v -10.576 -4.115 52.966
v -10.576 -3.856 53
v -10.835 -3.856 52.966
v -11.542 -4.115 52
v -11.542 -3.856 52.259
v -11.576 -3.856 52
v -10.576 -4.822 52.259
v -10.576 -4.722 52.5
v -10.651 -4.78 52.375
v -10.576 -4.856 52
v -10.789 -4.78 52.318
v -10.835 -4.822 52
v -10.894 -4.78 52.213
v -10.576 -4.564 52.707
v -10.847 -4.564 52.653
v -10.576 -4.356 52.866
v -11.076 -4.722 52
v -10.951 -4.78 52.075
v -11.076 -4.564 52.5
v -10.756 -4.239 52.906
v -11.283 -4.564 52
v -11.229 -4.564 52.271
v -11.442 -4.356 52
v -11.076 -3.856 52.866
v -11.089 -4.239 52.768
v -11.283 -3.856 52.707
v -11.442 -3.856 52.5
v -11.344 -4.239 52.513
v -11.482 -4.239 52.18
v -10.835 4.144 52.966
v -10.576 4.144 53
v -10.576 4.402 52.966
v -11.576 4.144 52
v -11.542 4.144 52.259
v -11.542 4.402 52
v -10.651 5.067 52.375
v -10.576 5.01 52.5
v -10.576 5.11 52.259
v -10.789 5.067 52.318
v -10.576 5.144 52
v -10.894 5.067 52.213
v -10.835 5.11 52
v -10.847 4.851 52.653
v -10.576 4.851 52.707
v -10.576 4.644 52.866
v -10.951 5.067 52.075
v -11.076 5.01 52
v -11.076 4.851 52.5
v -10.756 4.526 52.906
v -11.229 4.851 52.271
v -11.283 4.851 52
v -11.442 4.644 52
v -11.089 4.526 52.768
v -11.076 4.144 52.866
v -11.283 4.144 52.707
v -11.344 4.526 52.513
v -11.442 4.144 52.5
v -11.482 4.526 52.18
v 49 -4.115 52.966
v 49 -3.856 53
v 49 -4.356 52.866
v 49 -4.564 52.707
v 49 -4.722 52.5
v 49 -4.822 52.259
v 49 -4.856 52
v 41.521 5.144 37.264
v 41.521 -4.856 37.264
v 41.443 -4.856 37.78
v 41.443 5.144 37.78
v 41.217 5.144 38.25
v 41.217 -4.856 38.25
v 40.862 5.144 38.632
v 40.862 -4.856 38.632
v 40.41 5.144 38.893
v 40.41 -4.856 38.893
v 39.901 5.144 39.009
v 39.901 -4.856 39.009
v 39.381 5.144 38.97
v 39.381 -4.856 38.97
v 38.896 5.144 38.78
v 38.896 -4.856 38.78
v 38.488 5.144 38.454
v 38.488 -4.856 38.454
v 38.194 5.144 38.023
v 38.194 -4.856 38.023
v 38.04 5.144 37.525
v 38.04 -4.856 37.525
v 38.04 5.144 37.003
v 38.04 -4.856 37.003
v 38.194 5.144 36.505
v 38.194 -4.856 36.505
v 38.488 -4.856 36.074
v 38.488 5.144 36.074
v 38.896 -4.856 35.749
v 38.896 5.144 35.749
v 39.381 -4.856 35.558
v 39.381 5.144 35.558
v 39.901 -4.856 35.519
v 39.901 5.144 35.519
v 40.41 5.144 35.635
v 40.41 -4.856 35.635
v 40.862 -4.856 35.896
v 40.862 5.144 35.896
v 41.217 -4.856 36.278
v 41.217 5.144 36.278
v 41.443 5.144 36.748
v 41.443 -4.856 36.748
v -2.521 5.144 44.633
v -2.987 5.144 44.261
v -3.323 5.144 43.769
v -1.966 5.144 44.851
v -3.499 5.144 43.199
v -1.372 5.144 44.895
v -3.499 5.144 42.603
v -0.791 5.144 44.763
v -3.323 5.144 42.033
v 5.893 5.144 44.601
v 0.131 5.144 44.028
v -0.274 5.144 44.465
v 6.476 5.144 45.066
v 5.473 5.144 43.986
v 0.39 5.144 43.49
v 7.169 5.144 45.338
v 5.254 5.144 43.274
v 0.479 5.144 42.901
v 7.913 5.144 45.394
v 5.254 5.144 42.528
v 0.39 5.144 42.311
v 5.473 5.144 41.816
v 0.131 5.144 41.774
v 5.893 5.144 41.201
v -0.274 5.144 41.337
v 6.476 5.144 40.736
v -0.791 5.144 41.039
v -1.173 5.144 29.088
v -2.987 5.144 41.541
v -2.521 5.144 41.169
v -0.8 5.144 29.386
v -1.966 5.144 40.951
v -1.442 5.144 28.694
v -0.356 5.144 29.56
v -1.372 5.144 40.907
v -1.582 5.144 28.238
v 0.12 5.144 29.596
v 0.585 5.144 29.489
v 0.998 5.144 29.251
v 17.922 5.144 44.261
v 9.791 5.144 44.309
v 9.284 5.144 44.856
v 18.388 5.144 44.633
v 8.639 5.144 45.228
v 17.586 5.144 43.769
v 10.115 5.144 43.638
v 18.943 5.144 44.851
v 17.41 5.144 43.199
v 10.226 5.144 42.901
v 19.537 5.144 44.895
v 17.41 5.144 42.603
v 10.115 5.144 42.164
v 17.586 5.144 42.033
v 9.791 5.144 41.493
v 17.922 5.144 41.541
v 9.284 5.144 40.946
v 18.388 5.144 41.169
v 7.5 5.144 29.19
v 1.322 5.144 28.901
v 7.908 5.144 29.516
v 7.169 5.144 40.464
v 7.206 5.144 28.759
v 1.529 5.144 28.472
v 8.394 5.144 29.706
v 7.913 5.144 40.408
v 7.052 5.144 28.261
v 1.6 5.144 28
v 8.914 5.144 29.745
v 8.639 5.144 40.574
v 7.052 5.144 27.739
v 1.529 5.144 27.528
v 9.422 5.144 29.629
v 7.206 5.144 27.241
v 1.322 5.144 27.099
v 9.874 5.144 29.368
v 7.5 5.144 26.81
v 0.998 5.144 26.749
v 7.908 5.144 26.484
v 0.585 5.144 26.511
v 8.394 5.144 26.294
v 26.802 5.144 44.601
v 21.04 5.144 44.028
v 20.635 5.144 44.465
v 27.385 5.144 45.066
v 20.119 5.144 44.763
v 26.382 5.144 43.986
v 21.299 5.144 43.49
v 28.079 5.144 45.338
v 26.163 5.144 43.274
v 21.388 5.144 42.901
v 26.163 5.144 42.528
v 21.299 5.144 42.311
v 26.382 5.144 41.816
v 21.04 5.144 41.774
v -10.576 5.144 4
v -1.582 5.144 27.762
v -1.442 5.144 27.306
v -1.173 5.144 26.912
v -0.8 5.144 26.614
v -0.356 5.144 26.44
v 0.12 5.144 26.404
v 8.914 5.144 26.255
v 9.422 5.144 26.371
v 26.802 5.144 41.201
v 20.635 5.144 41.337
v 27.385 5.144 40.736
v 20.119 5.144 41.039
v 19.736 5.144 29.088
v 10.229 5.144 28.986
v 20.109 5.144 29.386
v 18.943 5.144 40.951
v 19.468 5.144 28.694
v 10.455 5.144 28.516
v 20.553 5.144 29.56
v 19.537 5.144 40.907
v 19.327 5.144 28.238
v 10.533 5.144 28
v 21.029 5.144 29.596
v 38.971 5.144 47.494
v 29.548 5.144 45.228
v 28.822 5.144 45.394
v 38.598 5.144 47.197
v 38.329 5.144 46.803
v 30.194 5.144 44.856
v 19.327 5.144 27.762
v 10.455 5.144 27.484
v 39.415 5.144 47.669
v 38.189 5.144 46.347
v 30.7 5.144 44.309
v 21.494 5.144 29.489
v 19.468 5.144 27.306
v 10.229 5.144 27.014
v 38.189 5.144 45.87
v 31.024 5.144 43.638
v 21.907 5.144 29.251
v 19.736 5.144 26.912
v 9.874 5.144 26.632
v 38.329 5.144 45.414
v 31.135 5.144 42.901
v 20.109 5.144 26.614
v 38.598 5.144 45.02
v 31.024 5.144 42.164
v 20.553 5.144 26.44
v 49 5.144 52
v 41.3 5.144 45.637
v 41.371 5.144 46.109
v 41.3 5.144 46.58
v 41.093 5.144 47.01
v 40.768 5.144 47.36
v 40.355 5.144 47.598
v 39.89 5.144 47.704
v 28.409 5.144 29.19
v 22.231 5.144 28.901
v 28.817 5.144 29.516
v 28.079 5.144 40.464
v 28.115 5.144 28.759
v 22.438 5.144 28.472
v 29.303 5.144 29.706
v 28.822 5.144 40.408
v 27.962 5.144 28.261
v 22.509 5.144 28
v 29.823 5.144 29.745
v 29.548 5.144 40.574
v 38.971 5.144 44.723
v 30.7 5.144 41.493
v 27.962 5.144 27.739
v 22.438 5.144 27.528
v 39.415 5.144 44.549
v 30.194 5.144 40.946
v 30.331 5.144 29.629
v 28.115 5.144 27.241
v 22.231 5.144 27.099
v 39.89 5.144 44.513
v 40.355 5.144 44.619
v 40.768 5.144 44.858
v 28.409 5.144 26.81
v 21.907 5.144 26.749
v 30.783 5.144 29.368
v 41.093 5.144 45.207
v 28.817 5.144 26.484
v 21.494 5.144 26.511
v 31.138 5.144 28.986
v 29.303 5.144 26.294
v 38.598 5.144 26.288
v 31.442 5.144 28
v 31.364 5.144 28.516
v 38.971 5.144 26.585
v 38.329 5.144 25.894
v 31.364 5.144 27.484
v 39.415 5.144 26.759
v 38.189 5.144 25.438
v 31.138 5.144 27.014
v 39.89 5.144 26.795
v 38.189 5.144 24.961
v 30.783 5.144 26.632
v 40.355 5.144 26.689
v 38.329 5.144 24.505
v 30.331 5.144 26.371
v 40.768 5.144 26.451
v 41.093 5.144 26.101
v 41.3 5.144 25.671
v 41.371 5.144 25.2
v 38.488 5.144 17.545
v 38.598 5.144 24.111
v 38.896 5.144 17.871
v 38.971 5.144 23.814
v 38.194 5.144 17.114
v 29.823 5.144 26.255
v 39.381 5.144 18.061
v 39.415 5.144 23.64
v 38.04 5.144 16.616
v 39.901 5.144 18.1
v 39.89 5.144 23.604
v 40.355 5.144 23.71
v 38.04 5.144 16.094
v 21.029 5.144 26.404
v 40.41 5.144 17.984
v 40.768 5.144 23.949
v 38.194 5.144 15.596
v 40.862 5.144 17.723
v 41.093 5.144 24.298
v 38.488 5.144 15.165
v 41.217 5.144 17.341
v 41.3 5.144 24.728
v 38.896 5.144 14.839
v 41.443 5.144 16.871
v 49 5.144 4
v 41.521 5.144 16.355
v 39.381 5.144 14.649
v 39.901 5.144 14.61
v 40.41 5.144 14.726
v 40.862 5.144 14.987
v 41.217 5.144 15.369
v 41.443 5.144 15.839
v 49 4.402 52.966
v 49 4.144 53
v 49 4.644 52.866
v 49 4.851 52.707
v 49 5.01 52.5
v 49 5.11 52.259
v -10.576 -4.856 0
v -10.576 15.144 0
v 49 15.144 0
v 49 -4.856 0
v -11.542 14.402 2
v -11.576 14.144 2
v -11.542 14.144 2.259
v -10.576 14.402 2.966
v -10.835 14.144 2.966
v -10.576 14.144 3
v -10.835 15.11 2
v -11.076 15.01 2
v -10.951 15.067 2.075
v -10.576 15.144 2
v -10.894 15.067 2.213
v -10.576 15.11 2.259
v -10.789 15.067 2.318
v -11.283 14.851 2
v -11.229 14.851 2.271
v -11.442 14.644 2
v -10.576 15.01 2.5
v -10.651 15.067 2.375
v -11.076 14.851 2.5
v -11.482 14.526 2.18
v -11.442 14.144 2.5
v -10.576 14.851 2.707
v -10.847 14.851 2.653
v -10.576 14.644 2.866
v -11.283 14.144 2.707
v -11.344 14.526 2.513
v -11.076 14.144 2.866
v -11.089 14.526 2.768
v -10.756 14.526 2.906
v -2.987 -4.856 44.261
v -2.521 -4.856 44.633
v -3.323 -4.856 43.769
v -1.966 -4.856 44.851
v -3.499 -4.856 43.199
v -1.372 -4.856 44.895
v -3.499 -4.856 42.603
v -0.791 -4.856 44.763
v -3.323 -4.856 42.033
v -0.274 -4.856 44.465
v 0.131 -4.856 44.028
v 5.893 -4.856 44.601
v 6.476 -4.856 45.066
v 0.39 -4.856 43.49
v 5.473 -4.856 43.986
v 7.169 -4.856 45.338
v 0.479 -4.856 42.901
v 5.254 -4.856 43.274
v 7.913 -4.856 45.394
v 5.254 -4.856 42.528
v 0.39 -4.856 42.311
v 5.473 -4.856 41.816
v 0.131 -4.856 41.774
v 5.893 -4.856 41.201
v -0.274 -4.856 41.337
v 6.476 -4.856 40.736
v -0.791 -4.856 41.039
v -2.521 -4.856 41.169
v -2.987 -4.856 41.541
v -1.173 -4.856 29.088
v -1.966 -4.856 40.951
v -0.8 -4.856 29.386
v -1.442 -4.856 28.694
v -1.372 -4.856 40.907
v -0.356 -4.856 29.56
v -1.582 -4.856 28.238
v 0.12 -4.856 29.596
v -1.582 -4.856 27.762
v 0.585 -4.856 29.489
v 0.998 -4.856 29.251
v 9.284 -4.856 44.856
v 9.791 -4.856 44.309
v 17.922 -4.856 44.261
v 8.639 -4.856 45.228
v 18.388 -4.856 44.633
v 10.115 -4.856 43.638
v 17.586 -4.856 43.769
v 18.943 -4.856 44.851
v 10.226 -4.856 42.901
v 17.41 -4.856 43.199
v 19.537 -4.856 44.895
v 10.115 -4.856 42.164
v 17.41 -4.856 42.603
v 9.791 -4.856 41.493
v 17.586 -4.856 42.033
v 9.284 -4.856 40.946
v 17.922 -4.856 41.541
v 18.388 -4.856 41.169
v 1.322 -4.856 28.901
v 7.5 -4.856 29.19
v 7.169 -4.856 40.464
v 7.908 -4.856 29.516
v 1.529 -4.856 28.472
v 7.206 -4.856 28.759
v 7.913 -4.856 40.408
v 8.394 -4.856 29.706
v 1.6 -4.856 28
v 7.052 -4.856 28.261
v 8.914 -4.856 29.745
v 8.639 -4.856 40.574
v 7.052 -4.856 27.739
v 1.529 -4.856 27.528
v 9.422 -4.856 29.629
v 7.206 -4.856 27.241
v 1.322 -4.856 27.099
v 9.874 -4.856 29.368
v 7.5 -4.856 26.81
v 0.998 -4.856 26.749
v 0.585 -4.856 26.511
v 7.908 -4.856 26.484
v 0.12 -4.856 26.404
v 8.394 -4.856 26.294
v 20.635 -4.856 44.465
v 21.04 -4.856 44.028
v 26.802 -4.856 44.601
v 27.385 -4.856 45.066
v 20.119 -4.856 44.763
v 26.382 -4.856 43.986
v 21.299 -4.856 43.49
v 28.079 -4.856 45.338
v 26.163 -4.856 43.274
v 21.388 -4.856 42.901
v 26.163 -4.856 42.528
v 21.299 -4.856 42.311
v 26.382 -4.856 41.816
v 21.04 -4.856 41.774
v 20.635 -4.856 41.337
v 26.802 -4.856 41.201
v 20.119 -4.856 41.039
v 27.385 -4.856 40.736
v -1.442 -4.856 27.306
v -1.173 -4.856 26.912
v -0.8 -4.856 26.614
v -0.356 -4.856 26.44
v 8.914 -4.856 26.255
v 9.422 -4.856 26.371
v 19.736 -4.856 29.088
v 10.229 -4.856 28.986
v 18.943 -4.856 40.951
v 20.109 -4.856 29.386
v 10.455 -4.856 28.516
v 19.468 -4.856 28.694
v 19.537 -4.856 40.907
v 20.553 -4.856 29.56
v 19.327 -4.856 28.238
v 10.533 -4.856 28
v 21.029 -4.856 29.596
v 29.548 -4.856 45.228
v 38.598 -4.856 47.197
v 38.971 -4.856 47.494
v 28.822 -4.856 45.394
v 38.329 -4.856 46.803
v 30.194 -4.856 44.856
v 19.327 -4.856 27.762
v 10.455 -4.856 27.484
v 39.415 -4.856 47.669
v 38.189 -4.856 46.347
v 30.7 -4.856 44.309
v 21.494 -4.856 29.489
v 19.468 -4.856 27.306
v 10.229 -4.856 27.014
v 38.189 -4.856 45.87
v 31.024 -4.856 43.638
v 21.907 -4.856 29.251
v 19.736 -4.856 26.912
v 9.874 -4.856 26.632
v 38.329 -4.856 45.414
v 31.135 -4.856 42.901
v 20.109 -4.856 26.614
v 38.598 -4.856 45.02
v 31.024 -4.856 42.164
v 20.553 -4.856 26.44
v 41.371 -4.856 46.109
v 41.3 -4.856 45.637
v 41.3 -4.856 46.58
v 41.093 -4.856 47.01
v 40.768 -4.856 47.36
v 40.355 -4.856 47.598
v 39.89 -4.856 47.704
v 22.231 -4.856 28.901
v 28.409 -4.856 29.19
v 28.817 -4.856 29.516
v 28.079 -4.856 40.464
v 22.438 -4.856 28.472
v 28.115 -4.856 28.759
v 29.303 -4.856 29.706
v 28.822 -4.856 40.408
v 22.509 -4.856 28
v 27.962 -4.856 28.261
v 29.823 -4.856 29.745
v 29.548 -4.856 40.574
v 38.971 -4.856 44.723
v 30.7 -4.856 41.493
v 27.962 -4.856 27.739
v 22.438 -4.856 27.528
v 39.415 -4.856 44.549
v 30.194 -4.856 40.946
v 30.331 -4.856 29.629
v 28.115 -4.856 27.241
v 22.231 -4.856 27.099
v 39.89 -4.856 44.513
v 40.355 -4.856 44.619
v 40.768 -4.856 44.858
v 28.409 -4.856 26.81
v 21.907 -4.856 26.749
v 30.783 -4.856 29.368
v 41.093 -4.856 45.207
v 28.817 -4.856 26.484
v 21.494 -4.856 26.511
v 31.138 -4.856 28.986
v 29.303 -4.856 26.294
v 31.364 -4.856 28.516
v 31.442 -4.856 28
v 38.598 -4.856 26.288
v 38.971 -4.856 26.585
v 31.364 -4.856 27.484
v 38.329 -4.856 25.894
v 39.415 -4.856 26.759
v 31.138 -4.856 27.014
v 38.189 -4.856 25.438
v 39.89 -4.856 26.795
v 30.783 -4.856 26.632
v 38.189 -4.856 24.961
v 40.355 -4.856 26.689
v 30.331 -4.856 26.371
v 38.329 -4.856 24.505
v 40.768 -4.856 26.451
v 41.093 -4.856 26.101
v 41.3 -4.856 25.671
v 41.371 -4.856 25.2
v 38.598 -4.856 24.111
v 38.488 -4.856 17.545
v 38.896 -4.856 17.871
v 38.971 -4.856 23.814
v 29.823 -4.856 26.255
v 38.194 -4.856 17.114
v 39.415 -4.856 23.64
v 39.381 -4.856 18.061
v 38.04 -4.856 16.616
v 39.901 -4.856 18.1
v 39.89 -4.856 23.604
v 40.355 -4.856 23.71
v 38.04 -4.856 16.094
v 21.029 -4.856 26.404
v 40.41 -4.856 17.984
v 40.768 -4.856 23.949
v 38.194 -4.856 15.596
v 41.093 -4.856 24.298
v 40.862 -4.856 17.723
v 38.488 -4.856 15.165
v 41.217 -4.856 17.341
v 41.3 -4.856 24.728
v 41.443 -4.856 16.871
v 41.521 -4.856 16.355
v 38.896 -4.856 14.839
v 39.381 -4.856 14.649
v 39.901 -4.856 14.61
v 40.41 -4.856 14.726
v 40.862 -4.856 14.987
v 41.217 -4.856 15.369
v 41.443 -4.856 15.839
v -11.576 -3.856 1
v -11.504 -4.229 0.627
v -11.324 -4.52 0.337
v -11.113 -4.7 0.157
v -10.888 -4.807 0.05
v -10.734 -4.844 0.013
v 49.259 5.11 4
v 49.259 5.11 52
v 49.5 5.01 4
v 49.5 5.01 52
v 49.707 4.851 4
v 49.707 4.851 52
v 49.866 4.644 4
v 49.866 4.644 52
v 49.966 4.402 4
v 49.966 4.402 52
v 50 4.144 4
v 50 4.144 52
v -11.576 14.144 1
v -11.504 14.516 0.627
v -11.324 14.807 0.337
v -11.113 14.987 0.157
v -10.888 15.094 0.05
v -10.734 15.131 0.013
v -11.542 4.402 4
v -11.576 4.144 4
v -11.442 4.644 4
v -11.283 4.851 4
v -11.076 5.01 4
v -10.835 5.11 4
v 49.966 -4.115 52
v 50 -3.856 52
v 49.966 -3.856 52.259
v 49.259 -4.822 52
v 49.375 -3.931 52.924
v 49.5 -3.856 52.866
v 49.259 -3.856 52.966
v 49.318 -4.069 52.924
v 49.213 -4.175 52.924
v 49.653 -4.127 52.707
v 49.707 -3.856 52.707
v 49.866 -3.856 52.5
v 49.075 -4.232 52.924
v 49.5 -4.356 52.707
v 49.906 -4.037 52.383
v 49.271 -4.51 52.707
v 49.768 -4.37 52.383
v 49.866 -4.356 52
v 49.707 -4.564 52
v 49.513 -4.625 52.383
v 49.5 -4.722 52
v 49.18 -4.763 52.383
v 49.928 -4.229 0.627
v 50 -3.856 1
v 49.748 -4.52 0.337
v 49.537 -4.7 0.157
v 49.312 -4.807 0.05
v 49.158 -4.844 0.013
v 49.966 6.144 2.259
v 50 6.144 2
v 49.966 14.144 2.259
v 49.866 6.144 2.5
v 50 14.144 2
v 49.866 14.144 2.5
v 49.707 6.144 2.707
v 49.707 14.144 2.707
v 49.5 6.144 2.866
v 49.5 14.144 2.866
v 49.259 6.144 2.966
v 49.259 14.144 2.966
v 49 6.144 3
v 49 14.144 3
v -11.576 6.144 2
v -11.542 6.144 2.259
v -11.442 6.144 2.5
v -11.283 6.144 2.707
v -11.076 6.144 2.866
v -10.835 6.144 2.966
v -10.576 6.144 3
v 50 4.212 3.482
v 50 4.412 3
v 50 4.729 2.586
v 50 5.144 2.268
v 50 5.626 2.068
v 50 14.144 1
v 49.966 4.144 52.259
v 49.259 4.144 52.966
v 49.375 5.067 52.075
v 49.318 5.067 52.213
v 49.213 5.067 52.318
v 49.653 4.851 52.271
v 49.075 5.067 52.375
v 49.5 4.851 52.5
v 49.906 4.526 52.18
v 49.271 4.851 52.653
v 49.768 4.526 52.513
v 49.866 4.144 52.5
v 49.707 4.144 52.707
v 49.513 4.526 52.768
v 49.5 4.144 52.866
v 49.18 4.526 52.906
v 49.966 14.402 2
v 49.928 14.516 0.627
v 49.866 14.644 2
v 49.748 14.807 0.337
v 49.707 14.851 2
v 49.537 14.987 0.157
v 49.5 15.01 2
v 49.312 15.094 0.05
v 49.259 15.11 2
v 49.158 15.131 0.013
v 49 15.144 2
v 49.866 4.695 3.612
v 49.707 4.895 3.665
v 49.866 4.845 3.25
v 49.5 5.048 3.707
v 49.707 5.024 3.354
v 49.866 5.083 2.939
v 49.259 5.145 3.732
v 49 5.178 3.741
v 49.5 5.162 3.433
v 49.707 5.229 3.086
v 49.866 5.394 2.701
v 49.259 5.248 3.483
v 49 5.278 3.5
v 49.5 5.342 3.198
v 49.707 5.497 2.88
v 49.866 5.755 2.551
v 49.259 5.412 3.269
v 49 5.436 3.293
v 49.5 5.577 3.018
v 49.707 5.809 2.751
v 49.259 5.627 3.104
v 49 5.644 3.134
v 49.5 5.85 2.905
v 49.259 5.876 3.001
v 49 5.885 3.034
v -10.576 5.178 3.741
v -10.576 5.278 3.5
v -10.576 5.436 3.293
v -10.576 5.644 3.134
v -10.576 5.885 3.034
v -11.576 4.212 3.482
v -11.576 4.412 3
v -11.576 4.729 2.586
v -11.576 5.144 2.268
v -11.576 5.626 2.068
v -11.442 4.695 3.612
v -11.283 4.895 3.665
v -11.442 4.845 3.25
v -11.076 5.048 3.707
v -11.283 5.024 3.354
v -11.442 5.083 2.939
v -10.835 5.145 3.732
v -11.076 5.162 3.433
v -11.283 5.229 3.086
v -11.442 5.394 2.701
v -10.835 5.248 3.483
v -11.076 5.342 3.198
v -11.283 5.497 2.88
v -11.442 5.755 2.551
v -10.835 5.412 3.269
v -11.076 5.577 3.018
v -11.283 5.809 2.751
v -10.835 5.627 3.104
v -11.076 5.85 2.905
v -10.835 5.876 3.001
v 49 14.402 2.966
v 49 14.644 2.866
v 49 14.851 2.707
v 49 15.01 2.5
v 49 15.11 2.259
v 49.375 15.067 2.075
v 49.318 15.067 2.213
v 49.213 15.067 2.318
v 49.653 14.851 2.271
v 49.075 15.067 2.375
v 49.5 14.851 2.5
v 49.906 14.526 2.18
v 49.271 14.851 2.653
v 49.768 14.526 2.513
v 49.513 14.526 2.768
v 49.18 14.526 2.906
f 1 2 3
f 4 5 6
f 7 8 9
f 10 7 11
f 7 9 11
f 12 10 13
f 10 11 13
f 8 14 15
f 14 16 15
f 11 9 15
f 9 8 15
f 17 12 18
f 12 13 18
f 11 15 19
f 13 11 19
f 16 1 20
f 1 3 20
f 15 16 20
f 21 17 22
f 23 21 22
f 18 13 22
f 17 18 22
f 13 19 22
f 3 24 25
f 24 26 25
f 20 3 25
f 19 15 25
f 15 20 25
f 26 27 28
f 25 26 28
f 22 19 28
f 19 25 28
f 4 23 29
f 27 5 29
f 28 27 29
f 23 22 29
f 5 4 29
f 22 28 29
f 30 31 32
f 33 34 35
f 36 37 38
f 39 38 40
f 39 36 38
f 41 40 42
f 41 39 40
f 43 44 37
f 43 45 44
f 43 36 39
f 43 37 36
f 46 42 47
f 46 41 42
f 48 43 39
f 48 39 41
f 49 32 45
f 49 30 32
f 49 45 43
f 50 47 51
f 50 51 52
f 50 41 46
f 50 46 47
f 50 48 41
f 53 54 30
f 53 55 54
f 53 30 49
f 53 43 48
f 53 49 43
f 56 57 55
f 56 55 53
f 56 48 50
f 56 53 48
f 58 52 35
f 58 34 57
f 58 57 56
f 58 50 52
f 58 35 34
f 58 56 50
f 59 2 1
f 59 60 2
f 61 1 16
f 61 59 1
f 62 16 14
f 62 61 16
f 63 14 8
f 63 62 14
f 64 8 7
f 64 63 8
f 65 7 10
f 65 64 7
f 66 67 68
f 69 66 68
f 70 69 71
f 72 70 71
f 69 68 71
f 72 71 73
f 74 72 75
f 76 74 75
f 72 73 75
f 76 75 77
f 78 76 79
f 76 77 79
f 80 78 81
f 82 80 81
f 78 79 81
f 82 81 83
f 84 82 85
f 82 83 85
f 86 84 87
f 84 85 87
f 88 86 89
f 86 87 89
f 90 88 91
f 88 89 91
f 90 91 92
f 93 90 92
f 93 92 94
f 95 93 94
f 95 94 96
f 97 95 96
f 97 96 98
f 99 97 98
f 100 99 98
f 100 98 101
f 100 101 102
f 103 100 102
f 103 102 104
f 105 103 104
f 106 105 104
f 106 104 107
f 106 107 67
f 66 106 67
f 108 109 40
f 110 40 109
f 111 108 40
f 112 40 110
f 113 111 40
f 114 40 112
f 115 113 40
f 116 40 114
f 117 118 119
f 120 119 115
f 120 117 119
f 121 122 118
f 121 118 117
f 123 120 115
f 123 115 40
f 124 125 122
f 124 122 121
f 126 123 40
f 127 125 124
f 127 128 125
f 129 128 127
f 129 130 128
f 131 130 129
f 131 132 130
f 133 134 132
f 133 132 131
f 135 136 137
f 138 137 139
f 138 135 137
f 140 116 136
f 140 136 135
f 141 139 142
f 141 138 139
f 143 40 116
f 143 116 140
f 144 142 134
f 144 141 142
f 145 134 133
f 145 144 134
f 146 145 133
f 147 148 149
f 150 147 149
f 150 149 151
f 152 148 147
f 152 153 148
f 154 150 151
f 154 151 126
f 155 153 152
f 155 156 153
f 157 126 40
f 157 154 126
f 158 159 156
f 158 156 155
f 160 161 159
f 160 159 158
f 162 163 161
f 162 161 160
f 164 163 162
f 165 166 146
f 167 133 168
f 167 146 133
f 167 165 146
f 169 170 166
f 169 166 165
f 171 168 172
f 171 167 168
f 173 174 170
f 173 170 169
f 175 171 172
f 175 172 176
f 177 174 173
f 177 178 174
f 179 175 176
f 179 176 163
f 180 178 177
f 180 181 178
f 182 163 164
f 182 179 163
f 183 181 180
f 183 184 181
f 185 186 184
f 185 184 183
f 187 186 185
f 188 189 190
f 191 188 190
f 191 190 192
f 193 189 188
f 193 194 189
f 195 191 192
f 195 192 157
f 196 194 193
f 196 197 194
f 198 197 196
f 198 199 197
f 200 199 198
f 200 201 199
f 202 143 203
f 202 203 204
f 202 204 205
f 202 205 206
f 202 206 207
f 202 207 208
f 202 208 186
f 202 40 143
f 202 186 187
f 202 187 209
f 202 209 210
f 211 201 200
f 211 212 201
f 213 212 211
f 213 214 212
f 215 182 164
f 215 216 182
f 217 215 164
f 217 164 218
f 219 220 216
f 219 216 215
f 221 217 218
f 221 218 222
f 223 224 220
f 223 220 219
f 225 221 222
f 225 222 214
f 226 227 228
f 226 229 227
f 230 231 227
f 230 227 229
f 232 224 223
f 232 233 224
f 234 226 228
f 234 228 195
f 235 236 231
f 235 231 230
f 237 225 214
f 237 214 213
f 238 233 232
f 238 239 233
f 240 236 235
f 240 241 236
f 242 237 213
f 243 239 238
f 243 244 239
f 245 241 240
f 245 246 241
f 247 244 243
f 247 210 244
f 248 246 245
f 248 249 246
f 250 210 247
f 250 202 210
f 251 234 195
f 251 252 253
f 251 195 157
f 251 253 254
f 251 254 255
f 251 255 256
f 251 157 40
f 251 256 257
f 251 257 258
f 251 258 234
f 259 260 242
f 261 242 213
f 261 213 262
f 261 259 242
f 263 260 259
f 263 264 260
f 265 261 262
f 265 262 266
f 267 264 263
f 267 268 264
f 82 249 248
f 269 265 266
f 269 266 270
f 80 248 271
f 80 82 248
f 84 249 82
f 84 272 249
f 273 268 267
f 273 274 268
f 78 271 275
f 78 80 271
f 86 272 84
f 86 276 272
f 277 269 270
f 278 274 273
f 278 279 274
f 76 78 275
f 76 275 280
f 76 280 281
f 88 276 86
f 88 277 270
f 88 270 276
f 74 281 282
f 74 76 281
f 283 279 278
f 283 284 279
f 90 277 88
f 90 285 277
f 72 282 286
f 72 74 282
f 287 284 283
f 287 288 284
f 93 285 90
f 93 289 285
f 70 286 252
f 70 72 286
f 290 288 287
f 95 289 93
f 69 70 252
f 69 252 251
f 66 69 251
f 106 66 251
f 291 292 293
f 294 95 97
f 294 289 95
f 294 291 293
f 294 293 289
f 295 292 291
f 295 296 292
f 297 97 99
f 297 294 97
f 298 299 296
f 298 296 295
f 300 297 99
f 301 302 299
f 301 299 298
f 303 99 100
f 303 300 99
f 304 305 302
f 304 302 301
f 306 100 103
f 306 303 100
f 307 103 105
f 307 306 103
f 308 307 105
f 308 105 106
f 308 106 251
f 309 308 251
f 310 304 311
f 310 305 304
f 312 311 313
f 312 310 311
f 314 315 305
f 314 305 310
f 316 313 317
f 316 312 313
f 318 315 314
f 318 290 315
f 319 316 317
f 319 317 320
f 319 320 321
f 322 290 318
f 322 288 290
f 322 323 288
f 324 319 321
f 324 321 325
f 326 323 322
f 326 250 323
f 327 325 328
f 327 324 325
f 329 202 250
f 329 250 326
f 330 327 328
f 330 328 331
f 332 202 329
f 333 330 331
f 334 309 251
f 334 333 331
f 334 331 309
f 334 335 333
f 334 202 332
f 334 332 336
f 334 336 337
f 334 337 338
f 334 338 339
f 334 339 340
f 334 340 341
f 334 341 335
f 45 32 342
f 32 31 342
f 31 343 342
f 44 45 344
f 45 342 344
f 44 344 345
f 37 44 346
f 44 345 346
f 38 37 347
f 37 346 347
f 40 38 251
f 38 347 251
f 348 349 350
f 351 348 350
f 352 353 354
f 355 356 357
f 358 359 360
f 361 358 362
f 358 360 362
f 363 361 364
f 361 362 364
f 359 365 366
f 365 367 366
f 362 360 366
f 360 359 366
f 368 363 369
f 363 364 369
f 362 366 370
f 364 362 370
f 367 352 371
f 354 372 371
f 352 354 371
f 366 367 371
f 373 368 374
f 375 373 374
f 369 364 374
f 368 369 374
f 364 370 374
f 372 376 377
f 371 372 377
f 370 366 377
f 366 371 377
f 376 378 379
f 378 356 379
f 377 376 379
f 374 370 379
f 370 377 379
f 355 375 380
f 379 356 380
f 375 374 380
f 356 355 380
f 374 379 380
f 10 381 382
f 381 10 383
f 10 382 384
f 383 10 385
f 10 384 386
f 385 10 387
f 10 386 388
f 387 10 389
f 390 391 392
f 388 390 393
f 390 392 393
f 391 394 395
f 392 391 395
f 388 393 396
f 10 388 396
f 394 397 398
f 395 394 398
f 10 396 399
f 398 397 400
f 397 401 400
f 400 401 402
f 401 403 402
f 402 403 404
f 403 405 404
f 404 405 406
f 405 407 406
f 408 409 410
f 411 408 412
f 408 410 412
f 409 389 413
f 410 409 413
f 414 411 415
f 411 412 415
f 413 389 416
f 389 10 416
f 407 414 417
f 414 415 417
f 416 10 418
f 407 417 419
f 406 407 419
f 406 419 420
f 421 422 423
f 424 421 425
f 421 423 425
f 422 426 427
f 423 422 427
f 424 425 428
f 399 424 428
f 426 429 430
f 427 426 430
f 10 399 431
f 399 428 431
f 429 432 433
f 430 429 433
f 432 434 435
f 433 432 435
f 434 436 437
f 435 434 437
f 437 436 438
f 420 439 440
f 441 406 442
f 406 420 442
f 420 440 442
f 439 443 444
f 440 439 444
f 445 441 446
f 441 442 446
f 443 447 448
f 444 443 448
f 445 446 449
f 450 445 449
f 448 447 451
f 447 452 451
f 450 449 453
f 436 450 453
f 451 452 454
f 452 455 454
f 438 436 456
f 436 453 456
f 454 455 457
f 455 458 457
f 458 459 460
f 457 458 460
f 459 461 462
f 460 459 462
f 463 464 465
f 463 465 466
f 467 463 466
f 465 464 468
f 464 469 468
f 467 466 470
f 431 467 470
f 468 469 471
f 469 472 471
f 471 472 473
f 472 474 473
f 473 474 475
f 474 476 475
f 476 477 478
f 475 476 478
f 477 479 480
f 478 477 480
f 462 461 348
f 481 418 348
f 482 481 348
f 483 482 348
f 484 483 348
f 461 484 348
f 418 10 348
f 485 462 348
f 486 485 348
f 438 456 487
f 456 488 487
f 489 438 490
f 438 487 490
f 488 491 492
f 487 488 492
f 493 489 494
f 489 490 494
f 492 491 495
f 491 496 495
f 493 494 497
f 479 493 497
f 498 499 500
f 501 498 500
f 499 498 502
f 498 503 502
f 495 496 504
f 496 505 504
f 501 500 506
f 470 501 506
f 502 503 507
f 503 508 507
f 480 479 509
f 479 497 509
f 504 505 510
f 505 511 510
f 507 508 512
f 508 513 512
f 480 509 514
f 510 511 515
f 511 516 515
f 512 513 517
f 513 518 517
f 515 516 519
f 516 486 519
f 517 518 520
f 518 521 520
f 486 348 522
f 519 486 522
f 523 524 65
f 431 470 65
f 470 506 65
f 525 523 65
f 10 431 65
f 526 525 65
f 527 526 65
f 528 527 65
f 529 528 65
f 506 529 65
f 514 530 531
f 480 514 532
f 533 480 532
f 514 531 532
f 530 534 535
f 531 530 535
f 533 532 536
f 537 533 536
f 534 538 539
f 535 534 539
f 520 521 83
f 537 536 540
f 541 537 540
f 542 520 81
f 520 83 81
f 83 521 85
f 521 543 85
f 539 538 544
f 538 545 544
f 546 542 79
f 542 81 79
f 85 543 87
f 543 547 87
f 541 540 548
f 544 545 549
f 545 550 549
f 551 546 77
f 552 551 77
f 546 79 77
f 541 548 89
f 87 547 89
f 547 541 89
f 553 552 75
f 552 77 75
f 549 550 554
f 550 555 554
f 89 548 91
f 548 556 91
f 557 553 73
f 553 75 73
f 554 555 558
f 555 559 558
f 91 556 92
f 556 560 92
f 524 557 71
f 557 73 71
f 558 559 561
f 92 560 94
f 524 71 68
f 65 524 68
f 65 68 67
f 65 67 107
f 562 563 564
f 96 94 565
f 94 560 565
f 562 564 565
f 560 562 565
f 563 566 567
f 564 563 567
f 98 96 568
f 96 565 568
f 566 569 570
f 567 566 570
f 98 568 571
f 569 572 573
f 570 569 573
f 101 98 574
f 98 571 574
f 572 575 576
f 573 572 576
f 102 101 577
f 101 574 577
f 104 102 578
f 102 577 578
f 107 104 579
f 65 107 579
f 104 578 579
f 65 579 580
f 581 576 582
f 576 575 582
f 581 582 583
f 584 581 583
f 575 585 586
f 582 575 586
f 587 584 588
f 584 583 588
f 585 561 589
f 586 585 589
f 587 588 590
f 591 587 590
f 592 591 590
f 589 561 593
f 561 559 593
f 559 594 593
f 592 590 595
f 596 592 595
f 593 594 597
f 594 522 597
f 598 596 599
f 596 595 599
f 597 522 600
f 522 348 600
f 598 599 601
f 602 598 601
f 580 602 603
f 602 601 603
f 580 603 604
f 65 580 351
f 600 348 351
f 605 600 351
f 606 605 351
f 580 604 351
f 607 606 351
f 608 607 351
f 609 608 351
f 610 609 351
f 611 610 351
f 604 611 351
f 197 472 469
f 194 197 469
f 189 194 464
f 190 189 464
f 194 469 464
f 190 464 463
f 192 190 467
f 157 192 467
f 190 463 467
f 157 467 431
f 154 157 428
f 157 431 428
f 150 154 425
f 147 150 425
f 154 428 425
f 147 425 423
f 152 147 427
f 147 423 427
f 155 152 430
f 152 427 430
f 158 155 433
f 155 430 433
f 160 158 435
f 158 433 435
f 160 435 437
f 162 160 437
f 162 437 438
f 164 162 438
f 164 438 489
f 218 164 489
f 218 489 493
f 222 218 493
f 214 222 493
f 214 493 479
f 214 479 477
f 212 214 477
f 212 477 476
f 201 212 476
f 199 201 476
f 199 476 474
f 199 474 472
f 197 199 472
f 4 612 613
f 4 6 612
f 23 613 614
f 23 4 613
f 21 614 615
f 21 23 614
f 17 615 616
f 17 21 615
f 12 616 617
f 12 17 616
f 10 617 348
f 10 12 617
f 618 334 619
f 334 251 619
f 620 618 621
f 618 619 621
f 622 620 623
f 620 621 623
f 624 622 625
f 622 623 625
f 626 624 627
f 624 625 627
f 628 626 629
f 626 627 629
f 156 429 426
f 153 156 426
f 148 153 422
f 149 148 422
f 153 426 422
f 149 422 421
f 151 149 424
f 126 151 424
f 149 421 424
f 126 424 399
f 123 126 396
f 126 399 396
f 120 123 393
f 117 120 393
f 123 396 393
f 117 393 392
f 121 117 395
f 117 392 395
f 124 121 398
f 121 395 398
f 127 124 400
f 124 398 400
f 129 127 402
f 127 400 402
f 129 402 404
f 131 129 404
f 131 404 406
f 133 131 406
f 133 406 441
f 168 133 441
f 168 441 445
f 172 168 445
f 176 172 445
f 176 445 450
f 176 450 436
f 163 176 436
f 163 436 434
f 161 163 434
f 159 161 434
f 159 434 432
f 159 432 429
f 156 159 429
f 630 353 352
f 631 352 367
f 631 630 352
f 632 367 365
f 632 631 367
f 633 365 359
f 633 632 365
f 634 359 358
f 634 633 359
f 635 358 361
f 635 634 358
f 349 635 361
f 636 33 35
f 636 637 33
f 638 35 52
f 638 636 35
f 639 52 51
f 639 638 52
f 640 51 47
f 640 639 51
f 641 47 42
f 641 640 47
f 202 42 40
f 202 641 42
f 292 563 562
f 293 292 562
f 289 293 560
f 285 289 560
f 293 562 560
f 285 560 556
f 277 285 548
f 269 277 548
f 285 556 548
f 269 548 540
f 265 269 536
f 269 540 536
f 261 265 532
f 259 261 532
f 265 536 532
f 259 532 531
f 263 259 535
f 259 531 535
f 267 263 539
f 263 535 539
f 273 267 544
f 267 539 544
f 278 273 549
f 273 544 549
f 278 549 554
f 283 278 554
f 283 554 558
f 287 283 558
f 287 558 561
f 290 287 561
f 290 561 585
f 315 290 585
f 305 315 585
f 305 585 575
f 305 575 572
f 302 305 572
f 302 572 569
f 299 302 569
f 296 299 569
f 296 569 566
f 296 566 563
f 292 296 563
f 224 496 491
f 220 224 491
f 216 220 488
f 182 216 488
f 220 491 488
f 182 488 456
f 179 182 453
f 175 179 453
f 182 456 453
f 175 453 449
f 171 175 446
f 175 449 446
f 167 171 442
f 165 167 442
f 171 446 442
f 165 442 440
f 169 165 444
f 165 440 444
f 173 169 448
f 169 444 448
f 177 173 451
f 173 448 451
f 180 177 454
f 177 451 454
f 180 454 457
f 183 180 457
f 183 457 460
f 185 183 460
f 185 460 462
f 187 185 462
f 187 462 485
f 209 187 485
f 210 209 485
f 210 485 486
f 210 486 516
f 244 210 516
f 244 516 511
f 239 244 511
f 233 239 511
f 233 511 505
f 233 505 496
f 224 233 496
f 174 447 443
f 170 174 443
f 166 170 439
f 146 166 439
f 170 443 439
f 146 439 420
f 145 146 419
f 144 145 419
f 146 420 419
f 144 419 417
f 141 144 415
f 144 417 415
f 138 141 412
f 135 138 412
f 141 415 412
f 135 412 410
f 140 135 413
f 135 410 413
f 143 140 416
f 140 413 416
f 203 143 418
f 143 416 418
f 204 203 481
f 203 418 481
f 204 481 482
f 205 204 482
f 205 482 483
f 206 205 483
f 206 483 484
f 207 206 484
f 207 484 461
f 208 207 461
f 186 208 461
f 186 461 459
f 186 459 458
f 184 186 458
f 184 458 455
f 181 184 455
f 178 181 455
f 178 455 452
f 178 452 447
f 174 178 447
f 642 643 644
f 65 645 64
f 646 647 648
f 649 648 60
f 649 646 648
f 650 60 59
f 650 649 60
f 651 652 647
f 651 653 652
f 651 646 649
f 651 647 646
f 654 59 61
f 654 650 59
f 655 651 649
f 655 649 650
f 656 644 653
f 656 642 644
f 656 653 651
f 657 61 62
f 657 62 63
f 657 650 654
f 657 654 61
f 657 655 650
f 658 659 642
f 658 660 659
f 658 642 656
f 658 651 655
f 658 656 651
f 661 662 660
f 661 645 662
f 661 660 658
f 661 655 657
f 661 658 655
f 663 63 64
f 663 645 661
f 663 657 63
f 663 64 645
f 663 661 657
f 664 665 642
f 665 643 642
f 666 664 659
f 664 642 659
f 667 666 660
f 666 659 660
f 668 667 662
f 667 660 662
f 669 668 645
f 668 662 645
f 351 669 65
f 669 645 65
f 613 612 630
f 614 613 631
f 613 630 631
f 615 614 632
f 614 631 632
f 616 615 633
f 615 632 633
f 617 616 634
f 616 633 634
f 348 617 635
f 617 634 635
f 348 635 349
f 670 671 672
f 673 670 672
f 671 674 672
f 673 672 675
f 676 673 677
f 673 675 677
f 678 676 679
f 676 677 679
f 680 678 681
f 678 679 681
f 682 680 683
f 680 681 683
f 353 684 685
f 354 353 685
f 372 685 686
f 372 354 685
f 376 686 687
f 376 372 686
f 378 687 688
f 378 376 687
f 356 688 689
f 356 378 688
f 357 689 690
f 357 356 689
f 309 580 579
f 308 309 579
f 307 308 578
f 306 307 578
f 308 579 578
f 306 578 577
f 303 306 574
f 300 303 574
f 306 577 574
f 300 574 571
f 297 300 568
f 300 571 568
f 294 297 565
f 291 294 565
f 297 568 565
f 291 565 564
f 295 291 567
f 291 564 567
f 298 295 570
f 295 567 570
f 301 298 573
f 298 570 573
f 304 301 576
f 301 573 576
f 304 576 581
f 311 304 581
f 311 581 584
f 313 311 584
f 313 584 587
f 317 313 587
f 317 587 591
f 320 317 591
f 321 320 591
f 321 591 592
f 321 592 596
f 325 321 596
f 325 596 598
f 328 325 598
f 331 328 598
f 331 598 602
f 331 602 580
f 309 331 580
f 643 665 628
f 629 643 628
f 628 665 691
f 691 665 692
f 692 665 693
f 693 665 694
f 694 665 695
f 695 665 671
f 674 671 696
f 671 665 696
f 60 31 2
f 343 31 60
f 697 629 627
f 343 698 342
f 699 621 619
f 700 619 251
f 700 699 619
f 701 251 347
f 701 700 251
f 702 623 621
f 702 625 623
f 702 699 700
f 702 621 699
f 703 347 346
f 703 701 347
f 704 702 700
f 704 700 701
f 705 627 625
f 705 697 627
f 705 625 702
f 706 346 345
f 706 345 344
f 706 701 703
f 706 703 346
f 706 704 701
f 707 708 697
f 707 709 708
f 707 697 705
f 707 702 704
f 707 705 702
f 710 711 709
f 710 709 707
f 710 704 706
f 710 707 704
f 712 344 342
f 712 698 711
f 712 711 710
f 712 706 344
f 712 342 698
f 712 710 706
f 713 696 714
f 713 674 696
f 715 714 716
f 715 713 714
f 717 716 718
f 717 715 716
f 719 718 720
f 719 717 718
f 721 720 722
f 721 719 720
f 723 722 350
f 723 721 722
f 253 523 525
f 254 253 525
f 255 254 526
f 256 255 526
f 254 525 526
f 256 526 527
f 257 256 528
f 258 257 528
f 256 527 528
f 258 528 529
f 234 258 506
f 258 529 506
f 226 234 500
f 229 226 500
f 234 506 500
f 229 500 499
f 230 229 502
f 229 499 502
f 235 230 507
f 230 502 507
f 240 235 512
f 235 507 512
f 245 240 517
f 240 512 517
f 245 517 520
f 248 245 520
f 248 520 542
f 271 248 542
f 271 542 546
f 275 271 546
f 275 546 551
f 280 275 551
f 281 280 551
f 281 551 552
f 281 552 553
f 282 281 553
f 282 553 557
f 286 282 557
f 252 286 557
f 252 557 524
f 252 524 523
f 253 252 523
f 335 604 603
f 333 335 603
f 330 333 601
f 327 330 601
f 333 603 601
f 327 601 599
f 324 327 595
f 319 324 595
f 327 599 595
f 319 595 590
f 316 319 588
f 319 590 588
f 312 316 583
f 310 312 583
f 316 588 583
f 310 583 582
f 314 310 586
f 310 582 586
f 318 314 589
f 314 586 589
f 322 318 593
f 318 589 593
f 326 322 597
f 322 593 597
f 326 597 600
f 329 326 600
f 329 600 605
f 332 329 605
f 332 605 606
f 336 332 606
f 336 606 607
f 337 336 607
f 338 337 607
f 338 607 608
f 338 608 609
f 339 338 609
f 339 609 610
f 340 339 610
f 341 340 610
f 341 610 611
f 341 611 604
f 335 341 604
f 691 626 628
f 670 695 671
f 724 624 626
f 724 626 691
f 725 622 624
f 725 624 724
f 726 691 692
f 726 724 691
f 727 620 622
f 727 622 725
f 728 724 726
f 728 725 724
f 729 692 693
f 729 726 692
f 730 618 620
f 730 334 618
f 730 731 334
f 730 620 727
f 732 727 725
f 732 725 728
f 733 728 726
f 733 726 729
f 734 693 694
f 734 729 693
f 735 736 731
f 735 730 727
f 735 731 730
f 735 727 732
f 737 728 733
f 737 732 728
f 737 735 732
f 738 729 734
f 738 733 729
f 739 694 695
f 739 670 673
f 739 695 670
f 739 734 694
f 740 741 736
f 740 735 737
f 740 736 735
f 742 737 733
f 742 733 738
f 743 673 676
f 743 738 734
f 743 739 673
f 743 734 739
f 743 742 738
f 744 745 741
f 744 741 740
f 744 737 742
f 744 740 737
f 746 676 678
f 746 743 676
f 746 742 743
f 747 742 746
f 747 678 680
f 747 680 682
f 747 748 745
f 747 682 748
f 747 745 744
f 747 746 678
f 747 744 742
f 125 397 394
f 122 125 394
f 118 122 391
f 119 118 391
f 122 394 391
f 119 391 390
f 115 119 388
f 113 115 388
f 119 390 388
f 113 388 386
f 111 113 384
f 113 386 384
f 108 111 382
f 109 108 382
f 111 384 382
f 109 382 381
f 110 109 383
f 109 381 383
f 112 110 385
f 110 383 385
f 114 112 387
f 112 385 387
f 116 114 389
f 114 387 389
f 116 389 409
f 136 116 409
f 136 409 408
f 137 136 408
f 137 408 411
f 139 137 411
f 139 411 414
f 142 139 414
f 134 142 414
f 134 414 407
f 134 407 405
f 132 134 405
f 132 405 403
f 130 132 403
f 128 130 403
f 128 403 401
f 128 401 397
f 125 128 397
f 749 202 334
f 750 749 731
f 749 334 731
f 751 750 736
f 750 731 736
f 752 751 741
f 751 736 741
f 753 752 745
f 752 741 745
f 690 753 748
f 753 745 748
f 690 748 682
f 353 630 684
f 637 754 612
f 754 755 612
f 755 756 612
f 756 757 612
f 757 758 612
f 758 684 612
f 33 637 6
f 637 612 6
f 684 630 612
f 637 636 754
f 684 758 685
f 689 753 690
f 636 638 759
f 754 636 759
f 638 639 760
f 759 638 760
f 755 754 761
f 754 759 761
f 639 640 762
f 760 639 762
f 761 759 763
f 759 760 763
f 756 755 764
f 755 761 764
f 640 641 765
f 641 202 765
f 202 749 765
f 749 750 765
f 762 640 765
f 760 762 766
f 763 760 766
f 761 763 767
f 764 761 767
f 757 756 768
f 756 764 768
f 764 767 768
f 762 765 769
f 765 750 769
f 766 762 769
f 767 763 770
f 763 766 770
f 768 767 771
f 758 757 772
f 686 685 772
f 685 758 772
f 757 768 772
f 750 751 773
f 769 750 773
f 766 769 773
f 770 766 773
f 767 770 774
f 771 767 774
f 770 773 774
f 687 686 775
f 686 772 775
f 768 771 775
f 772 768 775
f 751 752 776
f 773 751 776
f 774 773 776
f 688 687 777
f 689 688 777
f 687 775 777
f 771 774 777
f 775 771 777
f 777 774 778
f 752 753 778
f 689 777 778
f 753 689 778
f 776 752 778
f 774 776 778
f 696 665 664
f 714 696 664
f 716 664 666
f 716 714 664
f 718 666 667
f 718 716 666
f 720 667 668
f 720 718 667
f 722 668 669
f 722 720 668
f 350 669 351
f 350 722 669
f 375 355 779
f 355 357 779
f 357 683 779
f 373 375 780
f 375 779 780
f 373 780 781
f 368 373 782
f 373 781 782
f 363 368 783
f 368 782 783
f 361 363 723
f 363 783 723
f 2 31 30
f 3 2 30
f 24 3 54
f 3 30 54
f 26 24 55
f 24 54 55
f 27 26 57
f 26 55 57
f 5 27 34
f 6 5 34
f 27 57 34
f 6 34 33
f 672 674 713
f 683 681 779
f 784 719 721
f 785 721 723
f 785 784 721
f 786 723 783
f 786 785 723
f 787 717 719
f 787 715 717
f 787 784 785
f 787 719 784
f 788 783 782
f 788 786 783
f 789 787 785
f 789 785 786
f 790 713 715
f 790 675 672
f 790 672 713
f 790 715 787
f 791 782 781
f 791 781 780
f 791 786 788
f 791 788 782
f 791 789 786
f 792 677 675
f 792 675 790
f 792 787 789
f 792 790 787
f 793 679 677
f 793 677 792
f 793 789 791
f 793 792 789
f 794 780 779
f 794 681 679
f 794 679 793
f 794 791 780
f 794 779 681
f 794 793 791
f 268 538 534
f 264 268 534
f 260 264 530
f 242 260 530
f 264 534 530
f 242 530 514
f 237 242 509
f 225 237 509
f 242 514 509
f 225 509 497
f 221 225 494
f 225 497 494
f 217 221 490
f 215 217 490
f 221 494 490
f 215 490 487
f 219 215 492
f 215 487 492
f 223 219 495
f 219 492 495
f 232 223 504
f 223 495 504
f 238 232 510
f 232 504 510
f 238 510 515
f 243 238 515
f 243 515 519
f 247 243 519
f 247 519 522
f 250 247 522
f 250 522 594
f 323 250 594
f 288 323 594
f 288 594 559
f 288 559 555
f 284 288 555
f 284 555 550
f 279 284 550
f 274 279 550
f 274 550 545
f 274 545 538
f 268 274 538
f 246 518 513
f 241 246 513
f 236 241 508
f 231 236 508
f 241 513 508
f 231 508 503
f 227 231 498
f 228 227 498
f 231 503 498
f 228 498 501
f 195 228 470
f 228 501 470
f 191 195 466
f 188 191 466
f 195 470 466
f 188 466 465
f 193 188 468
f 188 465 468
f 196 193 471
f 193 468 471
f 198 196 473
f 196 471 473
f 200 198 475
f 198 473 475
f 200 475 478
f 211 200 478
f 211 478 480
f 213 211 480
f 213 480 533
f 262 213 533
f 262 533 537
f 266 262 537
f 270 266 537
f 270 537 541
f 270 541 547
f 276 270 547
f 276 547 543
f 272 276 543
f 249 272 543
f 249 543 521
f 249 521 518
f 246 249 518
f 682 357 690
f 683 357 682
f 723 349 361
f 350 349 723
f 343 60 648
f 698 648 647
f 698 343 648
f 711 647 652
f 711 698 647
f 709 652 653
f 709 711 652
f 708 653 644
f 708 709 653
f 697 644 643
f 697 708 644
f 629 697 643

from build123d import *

# Parameters (mm, degrees)
F0_W          = 100
F0_H          = 5
F1_DEPTH      = 3
F2_W          = 100
F2_H          = 10
F3_DEPTH      = 50
F4_R          = 1.6
F4_R_2        = 1.75
F4_R_3        = 2.5
F4_R_4        = 2
F5_DEPTH      = 50
F7_DEPTH      = 50
F7_DEPTH_BACK = 25
F8_R          = 1


with BuildPart() as f1:
    # F0 (on Top) → F1 (new body)
    with BuildSketch(Plane.XY):
        with Locations((0, 12.6435890049)):
            Rectangle(F0_W, F0_H)
        with Locations((0, 7.6435890049)):
            Rectangle(F0_W, F0_H)
        with Locations((0, 2.6435890049)):
            Rectangle(F0_W, F0_H)
        with Locations((0, -2.3564109951)):
            Rectangle(F0_W, F0_H)
    extrude(amount=F1_DEPTH)

    # F2 (on face) → F3 (join)
    with BuildSketch(Plane.XY.offset(3)):
        with Locations((0, 0.1435890049)):
            Rectangle(F2_W, F2_H)
    extrude(amount=F3_DEPTH)

    # F4 (on face) → F5 (cut)
    with BuildSketch(Plane.XZ.offset(4.8564109951)):
        with Locations((0, 28)):
            Circle(F4_R)
        with Locations((39.7706801567, 25.1996132218)):
            Circle(F4_R)
        with Locations((8.7829349406, 28)):
            Circle(F4_R_2)
        with Locations((39.7706801567, 37.2641024557)):
            Circle(F4_R_2)
        with Locations((20.9091, 28)):
            Circle(F4_R)
        with Locations((29.6920349406, 28)):
            Circle(F4_R_2)
        with Locations((39.7706801567, 46.1087132218)):
            Circle(F4_R)
        with Locations((39.7706801567, 16.3550024557)):
            Circle(F4_R_2)
        with Locations((7.7257619488, 42.9009612363)):
            Circle(F4_R_3)
        with Locations((28.6348619488, 42.9009612363)):
            Circle(F4_R_3)
        with Locations((-1.5212555765, 42.9009612363)):
            Circle(F4_R_4)
        with Locations((19.3878444235, 42.9009612363)):
            Circle(F4_R_4)
    extrude(amount=-F5_DEPTH, mode=Mode.SUBTRACT)

    # F6 (on face) → F7 (cut, two sides)
    with BuildSketch(Plane.XZ.offset(4.8564109951)) as f7_sk:
        Polygon((-50, 53), (-11.575919576, 53), (-11.575919576, 62.5623986125), (-61.6087988019, 62.5623986125), (-61.6087988019, -15.408792533), (-11.575919576, -17.8658775985), (-11.575919576, 0), (-50, 0), align=None)
        Polygon((-11.575919576, 0), (-11.575919576, 49.896787852), (-11.575919576, 53), (-50, 53), (-50, 0), align=None)
    extrude(amount=-F7_DEPTH, mode=Mode.SUBTRACT)
    extrude(f7_sk.sketch, amount=F7_DEPTH_BACK, mode=Mode.SUBTRACT)

    # F8
    f8_edges = [f1.edges().sort_by_distance(p)[0] for p in [
        (50, -4.856411, 26.5),
        (50, 0.143589, 53),
        (50, 5.143589, 28),
        (50, 10.143589, 3),
        (50, 15.143589, 1.5),
        (50, 5.143589, 0),
        (-11.57592, 0.143589, 53),
        (19.21204, 5.143589, 53),
        (19.21204, -4.856411, 53),
        (-11.57592, 5.143589, 0),
        (-11.57592, -4.856411, 26.5),
        (-11.57592, 5.143589, 28),
        (-11.57592, 10.143589, 3),
        (-11.57592, 15.143589, 1.5),
        (19.21204, 5.143589, 3),
        (19.21204, 15.143589, 3),
    ]]
    fillet(f8_edges, radius=F8_R)


solid = f1.part
